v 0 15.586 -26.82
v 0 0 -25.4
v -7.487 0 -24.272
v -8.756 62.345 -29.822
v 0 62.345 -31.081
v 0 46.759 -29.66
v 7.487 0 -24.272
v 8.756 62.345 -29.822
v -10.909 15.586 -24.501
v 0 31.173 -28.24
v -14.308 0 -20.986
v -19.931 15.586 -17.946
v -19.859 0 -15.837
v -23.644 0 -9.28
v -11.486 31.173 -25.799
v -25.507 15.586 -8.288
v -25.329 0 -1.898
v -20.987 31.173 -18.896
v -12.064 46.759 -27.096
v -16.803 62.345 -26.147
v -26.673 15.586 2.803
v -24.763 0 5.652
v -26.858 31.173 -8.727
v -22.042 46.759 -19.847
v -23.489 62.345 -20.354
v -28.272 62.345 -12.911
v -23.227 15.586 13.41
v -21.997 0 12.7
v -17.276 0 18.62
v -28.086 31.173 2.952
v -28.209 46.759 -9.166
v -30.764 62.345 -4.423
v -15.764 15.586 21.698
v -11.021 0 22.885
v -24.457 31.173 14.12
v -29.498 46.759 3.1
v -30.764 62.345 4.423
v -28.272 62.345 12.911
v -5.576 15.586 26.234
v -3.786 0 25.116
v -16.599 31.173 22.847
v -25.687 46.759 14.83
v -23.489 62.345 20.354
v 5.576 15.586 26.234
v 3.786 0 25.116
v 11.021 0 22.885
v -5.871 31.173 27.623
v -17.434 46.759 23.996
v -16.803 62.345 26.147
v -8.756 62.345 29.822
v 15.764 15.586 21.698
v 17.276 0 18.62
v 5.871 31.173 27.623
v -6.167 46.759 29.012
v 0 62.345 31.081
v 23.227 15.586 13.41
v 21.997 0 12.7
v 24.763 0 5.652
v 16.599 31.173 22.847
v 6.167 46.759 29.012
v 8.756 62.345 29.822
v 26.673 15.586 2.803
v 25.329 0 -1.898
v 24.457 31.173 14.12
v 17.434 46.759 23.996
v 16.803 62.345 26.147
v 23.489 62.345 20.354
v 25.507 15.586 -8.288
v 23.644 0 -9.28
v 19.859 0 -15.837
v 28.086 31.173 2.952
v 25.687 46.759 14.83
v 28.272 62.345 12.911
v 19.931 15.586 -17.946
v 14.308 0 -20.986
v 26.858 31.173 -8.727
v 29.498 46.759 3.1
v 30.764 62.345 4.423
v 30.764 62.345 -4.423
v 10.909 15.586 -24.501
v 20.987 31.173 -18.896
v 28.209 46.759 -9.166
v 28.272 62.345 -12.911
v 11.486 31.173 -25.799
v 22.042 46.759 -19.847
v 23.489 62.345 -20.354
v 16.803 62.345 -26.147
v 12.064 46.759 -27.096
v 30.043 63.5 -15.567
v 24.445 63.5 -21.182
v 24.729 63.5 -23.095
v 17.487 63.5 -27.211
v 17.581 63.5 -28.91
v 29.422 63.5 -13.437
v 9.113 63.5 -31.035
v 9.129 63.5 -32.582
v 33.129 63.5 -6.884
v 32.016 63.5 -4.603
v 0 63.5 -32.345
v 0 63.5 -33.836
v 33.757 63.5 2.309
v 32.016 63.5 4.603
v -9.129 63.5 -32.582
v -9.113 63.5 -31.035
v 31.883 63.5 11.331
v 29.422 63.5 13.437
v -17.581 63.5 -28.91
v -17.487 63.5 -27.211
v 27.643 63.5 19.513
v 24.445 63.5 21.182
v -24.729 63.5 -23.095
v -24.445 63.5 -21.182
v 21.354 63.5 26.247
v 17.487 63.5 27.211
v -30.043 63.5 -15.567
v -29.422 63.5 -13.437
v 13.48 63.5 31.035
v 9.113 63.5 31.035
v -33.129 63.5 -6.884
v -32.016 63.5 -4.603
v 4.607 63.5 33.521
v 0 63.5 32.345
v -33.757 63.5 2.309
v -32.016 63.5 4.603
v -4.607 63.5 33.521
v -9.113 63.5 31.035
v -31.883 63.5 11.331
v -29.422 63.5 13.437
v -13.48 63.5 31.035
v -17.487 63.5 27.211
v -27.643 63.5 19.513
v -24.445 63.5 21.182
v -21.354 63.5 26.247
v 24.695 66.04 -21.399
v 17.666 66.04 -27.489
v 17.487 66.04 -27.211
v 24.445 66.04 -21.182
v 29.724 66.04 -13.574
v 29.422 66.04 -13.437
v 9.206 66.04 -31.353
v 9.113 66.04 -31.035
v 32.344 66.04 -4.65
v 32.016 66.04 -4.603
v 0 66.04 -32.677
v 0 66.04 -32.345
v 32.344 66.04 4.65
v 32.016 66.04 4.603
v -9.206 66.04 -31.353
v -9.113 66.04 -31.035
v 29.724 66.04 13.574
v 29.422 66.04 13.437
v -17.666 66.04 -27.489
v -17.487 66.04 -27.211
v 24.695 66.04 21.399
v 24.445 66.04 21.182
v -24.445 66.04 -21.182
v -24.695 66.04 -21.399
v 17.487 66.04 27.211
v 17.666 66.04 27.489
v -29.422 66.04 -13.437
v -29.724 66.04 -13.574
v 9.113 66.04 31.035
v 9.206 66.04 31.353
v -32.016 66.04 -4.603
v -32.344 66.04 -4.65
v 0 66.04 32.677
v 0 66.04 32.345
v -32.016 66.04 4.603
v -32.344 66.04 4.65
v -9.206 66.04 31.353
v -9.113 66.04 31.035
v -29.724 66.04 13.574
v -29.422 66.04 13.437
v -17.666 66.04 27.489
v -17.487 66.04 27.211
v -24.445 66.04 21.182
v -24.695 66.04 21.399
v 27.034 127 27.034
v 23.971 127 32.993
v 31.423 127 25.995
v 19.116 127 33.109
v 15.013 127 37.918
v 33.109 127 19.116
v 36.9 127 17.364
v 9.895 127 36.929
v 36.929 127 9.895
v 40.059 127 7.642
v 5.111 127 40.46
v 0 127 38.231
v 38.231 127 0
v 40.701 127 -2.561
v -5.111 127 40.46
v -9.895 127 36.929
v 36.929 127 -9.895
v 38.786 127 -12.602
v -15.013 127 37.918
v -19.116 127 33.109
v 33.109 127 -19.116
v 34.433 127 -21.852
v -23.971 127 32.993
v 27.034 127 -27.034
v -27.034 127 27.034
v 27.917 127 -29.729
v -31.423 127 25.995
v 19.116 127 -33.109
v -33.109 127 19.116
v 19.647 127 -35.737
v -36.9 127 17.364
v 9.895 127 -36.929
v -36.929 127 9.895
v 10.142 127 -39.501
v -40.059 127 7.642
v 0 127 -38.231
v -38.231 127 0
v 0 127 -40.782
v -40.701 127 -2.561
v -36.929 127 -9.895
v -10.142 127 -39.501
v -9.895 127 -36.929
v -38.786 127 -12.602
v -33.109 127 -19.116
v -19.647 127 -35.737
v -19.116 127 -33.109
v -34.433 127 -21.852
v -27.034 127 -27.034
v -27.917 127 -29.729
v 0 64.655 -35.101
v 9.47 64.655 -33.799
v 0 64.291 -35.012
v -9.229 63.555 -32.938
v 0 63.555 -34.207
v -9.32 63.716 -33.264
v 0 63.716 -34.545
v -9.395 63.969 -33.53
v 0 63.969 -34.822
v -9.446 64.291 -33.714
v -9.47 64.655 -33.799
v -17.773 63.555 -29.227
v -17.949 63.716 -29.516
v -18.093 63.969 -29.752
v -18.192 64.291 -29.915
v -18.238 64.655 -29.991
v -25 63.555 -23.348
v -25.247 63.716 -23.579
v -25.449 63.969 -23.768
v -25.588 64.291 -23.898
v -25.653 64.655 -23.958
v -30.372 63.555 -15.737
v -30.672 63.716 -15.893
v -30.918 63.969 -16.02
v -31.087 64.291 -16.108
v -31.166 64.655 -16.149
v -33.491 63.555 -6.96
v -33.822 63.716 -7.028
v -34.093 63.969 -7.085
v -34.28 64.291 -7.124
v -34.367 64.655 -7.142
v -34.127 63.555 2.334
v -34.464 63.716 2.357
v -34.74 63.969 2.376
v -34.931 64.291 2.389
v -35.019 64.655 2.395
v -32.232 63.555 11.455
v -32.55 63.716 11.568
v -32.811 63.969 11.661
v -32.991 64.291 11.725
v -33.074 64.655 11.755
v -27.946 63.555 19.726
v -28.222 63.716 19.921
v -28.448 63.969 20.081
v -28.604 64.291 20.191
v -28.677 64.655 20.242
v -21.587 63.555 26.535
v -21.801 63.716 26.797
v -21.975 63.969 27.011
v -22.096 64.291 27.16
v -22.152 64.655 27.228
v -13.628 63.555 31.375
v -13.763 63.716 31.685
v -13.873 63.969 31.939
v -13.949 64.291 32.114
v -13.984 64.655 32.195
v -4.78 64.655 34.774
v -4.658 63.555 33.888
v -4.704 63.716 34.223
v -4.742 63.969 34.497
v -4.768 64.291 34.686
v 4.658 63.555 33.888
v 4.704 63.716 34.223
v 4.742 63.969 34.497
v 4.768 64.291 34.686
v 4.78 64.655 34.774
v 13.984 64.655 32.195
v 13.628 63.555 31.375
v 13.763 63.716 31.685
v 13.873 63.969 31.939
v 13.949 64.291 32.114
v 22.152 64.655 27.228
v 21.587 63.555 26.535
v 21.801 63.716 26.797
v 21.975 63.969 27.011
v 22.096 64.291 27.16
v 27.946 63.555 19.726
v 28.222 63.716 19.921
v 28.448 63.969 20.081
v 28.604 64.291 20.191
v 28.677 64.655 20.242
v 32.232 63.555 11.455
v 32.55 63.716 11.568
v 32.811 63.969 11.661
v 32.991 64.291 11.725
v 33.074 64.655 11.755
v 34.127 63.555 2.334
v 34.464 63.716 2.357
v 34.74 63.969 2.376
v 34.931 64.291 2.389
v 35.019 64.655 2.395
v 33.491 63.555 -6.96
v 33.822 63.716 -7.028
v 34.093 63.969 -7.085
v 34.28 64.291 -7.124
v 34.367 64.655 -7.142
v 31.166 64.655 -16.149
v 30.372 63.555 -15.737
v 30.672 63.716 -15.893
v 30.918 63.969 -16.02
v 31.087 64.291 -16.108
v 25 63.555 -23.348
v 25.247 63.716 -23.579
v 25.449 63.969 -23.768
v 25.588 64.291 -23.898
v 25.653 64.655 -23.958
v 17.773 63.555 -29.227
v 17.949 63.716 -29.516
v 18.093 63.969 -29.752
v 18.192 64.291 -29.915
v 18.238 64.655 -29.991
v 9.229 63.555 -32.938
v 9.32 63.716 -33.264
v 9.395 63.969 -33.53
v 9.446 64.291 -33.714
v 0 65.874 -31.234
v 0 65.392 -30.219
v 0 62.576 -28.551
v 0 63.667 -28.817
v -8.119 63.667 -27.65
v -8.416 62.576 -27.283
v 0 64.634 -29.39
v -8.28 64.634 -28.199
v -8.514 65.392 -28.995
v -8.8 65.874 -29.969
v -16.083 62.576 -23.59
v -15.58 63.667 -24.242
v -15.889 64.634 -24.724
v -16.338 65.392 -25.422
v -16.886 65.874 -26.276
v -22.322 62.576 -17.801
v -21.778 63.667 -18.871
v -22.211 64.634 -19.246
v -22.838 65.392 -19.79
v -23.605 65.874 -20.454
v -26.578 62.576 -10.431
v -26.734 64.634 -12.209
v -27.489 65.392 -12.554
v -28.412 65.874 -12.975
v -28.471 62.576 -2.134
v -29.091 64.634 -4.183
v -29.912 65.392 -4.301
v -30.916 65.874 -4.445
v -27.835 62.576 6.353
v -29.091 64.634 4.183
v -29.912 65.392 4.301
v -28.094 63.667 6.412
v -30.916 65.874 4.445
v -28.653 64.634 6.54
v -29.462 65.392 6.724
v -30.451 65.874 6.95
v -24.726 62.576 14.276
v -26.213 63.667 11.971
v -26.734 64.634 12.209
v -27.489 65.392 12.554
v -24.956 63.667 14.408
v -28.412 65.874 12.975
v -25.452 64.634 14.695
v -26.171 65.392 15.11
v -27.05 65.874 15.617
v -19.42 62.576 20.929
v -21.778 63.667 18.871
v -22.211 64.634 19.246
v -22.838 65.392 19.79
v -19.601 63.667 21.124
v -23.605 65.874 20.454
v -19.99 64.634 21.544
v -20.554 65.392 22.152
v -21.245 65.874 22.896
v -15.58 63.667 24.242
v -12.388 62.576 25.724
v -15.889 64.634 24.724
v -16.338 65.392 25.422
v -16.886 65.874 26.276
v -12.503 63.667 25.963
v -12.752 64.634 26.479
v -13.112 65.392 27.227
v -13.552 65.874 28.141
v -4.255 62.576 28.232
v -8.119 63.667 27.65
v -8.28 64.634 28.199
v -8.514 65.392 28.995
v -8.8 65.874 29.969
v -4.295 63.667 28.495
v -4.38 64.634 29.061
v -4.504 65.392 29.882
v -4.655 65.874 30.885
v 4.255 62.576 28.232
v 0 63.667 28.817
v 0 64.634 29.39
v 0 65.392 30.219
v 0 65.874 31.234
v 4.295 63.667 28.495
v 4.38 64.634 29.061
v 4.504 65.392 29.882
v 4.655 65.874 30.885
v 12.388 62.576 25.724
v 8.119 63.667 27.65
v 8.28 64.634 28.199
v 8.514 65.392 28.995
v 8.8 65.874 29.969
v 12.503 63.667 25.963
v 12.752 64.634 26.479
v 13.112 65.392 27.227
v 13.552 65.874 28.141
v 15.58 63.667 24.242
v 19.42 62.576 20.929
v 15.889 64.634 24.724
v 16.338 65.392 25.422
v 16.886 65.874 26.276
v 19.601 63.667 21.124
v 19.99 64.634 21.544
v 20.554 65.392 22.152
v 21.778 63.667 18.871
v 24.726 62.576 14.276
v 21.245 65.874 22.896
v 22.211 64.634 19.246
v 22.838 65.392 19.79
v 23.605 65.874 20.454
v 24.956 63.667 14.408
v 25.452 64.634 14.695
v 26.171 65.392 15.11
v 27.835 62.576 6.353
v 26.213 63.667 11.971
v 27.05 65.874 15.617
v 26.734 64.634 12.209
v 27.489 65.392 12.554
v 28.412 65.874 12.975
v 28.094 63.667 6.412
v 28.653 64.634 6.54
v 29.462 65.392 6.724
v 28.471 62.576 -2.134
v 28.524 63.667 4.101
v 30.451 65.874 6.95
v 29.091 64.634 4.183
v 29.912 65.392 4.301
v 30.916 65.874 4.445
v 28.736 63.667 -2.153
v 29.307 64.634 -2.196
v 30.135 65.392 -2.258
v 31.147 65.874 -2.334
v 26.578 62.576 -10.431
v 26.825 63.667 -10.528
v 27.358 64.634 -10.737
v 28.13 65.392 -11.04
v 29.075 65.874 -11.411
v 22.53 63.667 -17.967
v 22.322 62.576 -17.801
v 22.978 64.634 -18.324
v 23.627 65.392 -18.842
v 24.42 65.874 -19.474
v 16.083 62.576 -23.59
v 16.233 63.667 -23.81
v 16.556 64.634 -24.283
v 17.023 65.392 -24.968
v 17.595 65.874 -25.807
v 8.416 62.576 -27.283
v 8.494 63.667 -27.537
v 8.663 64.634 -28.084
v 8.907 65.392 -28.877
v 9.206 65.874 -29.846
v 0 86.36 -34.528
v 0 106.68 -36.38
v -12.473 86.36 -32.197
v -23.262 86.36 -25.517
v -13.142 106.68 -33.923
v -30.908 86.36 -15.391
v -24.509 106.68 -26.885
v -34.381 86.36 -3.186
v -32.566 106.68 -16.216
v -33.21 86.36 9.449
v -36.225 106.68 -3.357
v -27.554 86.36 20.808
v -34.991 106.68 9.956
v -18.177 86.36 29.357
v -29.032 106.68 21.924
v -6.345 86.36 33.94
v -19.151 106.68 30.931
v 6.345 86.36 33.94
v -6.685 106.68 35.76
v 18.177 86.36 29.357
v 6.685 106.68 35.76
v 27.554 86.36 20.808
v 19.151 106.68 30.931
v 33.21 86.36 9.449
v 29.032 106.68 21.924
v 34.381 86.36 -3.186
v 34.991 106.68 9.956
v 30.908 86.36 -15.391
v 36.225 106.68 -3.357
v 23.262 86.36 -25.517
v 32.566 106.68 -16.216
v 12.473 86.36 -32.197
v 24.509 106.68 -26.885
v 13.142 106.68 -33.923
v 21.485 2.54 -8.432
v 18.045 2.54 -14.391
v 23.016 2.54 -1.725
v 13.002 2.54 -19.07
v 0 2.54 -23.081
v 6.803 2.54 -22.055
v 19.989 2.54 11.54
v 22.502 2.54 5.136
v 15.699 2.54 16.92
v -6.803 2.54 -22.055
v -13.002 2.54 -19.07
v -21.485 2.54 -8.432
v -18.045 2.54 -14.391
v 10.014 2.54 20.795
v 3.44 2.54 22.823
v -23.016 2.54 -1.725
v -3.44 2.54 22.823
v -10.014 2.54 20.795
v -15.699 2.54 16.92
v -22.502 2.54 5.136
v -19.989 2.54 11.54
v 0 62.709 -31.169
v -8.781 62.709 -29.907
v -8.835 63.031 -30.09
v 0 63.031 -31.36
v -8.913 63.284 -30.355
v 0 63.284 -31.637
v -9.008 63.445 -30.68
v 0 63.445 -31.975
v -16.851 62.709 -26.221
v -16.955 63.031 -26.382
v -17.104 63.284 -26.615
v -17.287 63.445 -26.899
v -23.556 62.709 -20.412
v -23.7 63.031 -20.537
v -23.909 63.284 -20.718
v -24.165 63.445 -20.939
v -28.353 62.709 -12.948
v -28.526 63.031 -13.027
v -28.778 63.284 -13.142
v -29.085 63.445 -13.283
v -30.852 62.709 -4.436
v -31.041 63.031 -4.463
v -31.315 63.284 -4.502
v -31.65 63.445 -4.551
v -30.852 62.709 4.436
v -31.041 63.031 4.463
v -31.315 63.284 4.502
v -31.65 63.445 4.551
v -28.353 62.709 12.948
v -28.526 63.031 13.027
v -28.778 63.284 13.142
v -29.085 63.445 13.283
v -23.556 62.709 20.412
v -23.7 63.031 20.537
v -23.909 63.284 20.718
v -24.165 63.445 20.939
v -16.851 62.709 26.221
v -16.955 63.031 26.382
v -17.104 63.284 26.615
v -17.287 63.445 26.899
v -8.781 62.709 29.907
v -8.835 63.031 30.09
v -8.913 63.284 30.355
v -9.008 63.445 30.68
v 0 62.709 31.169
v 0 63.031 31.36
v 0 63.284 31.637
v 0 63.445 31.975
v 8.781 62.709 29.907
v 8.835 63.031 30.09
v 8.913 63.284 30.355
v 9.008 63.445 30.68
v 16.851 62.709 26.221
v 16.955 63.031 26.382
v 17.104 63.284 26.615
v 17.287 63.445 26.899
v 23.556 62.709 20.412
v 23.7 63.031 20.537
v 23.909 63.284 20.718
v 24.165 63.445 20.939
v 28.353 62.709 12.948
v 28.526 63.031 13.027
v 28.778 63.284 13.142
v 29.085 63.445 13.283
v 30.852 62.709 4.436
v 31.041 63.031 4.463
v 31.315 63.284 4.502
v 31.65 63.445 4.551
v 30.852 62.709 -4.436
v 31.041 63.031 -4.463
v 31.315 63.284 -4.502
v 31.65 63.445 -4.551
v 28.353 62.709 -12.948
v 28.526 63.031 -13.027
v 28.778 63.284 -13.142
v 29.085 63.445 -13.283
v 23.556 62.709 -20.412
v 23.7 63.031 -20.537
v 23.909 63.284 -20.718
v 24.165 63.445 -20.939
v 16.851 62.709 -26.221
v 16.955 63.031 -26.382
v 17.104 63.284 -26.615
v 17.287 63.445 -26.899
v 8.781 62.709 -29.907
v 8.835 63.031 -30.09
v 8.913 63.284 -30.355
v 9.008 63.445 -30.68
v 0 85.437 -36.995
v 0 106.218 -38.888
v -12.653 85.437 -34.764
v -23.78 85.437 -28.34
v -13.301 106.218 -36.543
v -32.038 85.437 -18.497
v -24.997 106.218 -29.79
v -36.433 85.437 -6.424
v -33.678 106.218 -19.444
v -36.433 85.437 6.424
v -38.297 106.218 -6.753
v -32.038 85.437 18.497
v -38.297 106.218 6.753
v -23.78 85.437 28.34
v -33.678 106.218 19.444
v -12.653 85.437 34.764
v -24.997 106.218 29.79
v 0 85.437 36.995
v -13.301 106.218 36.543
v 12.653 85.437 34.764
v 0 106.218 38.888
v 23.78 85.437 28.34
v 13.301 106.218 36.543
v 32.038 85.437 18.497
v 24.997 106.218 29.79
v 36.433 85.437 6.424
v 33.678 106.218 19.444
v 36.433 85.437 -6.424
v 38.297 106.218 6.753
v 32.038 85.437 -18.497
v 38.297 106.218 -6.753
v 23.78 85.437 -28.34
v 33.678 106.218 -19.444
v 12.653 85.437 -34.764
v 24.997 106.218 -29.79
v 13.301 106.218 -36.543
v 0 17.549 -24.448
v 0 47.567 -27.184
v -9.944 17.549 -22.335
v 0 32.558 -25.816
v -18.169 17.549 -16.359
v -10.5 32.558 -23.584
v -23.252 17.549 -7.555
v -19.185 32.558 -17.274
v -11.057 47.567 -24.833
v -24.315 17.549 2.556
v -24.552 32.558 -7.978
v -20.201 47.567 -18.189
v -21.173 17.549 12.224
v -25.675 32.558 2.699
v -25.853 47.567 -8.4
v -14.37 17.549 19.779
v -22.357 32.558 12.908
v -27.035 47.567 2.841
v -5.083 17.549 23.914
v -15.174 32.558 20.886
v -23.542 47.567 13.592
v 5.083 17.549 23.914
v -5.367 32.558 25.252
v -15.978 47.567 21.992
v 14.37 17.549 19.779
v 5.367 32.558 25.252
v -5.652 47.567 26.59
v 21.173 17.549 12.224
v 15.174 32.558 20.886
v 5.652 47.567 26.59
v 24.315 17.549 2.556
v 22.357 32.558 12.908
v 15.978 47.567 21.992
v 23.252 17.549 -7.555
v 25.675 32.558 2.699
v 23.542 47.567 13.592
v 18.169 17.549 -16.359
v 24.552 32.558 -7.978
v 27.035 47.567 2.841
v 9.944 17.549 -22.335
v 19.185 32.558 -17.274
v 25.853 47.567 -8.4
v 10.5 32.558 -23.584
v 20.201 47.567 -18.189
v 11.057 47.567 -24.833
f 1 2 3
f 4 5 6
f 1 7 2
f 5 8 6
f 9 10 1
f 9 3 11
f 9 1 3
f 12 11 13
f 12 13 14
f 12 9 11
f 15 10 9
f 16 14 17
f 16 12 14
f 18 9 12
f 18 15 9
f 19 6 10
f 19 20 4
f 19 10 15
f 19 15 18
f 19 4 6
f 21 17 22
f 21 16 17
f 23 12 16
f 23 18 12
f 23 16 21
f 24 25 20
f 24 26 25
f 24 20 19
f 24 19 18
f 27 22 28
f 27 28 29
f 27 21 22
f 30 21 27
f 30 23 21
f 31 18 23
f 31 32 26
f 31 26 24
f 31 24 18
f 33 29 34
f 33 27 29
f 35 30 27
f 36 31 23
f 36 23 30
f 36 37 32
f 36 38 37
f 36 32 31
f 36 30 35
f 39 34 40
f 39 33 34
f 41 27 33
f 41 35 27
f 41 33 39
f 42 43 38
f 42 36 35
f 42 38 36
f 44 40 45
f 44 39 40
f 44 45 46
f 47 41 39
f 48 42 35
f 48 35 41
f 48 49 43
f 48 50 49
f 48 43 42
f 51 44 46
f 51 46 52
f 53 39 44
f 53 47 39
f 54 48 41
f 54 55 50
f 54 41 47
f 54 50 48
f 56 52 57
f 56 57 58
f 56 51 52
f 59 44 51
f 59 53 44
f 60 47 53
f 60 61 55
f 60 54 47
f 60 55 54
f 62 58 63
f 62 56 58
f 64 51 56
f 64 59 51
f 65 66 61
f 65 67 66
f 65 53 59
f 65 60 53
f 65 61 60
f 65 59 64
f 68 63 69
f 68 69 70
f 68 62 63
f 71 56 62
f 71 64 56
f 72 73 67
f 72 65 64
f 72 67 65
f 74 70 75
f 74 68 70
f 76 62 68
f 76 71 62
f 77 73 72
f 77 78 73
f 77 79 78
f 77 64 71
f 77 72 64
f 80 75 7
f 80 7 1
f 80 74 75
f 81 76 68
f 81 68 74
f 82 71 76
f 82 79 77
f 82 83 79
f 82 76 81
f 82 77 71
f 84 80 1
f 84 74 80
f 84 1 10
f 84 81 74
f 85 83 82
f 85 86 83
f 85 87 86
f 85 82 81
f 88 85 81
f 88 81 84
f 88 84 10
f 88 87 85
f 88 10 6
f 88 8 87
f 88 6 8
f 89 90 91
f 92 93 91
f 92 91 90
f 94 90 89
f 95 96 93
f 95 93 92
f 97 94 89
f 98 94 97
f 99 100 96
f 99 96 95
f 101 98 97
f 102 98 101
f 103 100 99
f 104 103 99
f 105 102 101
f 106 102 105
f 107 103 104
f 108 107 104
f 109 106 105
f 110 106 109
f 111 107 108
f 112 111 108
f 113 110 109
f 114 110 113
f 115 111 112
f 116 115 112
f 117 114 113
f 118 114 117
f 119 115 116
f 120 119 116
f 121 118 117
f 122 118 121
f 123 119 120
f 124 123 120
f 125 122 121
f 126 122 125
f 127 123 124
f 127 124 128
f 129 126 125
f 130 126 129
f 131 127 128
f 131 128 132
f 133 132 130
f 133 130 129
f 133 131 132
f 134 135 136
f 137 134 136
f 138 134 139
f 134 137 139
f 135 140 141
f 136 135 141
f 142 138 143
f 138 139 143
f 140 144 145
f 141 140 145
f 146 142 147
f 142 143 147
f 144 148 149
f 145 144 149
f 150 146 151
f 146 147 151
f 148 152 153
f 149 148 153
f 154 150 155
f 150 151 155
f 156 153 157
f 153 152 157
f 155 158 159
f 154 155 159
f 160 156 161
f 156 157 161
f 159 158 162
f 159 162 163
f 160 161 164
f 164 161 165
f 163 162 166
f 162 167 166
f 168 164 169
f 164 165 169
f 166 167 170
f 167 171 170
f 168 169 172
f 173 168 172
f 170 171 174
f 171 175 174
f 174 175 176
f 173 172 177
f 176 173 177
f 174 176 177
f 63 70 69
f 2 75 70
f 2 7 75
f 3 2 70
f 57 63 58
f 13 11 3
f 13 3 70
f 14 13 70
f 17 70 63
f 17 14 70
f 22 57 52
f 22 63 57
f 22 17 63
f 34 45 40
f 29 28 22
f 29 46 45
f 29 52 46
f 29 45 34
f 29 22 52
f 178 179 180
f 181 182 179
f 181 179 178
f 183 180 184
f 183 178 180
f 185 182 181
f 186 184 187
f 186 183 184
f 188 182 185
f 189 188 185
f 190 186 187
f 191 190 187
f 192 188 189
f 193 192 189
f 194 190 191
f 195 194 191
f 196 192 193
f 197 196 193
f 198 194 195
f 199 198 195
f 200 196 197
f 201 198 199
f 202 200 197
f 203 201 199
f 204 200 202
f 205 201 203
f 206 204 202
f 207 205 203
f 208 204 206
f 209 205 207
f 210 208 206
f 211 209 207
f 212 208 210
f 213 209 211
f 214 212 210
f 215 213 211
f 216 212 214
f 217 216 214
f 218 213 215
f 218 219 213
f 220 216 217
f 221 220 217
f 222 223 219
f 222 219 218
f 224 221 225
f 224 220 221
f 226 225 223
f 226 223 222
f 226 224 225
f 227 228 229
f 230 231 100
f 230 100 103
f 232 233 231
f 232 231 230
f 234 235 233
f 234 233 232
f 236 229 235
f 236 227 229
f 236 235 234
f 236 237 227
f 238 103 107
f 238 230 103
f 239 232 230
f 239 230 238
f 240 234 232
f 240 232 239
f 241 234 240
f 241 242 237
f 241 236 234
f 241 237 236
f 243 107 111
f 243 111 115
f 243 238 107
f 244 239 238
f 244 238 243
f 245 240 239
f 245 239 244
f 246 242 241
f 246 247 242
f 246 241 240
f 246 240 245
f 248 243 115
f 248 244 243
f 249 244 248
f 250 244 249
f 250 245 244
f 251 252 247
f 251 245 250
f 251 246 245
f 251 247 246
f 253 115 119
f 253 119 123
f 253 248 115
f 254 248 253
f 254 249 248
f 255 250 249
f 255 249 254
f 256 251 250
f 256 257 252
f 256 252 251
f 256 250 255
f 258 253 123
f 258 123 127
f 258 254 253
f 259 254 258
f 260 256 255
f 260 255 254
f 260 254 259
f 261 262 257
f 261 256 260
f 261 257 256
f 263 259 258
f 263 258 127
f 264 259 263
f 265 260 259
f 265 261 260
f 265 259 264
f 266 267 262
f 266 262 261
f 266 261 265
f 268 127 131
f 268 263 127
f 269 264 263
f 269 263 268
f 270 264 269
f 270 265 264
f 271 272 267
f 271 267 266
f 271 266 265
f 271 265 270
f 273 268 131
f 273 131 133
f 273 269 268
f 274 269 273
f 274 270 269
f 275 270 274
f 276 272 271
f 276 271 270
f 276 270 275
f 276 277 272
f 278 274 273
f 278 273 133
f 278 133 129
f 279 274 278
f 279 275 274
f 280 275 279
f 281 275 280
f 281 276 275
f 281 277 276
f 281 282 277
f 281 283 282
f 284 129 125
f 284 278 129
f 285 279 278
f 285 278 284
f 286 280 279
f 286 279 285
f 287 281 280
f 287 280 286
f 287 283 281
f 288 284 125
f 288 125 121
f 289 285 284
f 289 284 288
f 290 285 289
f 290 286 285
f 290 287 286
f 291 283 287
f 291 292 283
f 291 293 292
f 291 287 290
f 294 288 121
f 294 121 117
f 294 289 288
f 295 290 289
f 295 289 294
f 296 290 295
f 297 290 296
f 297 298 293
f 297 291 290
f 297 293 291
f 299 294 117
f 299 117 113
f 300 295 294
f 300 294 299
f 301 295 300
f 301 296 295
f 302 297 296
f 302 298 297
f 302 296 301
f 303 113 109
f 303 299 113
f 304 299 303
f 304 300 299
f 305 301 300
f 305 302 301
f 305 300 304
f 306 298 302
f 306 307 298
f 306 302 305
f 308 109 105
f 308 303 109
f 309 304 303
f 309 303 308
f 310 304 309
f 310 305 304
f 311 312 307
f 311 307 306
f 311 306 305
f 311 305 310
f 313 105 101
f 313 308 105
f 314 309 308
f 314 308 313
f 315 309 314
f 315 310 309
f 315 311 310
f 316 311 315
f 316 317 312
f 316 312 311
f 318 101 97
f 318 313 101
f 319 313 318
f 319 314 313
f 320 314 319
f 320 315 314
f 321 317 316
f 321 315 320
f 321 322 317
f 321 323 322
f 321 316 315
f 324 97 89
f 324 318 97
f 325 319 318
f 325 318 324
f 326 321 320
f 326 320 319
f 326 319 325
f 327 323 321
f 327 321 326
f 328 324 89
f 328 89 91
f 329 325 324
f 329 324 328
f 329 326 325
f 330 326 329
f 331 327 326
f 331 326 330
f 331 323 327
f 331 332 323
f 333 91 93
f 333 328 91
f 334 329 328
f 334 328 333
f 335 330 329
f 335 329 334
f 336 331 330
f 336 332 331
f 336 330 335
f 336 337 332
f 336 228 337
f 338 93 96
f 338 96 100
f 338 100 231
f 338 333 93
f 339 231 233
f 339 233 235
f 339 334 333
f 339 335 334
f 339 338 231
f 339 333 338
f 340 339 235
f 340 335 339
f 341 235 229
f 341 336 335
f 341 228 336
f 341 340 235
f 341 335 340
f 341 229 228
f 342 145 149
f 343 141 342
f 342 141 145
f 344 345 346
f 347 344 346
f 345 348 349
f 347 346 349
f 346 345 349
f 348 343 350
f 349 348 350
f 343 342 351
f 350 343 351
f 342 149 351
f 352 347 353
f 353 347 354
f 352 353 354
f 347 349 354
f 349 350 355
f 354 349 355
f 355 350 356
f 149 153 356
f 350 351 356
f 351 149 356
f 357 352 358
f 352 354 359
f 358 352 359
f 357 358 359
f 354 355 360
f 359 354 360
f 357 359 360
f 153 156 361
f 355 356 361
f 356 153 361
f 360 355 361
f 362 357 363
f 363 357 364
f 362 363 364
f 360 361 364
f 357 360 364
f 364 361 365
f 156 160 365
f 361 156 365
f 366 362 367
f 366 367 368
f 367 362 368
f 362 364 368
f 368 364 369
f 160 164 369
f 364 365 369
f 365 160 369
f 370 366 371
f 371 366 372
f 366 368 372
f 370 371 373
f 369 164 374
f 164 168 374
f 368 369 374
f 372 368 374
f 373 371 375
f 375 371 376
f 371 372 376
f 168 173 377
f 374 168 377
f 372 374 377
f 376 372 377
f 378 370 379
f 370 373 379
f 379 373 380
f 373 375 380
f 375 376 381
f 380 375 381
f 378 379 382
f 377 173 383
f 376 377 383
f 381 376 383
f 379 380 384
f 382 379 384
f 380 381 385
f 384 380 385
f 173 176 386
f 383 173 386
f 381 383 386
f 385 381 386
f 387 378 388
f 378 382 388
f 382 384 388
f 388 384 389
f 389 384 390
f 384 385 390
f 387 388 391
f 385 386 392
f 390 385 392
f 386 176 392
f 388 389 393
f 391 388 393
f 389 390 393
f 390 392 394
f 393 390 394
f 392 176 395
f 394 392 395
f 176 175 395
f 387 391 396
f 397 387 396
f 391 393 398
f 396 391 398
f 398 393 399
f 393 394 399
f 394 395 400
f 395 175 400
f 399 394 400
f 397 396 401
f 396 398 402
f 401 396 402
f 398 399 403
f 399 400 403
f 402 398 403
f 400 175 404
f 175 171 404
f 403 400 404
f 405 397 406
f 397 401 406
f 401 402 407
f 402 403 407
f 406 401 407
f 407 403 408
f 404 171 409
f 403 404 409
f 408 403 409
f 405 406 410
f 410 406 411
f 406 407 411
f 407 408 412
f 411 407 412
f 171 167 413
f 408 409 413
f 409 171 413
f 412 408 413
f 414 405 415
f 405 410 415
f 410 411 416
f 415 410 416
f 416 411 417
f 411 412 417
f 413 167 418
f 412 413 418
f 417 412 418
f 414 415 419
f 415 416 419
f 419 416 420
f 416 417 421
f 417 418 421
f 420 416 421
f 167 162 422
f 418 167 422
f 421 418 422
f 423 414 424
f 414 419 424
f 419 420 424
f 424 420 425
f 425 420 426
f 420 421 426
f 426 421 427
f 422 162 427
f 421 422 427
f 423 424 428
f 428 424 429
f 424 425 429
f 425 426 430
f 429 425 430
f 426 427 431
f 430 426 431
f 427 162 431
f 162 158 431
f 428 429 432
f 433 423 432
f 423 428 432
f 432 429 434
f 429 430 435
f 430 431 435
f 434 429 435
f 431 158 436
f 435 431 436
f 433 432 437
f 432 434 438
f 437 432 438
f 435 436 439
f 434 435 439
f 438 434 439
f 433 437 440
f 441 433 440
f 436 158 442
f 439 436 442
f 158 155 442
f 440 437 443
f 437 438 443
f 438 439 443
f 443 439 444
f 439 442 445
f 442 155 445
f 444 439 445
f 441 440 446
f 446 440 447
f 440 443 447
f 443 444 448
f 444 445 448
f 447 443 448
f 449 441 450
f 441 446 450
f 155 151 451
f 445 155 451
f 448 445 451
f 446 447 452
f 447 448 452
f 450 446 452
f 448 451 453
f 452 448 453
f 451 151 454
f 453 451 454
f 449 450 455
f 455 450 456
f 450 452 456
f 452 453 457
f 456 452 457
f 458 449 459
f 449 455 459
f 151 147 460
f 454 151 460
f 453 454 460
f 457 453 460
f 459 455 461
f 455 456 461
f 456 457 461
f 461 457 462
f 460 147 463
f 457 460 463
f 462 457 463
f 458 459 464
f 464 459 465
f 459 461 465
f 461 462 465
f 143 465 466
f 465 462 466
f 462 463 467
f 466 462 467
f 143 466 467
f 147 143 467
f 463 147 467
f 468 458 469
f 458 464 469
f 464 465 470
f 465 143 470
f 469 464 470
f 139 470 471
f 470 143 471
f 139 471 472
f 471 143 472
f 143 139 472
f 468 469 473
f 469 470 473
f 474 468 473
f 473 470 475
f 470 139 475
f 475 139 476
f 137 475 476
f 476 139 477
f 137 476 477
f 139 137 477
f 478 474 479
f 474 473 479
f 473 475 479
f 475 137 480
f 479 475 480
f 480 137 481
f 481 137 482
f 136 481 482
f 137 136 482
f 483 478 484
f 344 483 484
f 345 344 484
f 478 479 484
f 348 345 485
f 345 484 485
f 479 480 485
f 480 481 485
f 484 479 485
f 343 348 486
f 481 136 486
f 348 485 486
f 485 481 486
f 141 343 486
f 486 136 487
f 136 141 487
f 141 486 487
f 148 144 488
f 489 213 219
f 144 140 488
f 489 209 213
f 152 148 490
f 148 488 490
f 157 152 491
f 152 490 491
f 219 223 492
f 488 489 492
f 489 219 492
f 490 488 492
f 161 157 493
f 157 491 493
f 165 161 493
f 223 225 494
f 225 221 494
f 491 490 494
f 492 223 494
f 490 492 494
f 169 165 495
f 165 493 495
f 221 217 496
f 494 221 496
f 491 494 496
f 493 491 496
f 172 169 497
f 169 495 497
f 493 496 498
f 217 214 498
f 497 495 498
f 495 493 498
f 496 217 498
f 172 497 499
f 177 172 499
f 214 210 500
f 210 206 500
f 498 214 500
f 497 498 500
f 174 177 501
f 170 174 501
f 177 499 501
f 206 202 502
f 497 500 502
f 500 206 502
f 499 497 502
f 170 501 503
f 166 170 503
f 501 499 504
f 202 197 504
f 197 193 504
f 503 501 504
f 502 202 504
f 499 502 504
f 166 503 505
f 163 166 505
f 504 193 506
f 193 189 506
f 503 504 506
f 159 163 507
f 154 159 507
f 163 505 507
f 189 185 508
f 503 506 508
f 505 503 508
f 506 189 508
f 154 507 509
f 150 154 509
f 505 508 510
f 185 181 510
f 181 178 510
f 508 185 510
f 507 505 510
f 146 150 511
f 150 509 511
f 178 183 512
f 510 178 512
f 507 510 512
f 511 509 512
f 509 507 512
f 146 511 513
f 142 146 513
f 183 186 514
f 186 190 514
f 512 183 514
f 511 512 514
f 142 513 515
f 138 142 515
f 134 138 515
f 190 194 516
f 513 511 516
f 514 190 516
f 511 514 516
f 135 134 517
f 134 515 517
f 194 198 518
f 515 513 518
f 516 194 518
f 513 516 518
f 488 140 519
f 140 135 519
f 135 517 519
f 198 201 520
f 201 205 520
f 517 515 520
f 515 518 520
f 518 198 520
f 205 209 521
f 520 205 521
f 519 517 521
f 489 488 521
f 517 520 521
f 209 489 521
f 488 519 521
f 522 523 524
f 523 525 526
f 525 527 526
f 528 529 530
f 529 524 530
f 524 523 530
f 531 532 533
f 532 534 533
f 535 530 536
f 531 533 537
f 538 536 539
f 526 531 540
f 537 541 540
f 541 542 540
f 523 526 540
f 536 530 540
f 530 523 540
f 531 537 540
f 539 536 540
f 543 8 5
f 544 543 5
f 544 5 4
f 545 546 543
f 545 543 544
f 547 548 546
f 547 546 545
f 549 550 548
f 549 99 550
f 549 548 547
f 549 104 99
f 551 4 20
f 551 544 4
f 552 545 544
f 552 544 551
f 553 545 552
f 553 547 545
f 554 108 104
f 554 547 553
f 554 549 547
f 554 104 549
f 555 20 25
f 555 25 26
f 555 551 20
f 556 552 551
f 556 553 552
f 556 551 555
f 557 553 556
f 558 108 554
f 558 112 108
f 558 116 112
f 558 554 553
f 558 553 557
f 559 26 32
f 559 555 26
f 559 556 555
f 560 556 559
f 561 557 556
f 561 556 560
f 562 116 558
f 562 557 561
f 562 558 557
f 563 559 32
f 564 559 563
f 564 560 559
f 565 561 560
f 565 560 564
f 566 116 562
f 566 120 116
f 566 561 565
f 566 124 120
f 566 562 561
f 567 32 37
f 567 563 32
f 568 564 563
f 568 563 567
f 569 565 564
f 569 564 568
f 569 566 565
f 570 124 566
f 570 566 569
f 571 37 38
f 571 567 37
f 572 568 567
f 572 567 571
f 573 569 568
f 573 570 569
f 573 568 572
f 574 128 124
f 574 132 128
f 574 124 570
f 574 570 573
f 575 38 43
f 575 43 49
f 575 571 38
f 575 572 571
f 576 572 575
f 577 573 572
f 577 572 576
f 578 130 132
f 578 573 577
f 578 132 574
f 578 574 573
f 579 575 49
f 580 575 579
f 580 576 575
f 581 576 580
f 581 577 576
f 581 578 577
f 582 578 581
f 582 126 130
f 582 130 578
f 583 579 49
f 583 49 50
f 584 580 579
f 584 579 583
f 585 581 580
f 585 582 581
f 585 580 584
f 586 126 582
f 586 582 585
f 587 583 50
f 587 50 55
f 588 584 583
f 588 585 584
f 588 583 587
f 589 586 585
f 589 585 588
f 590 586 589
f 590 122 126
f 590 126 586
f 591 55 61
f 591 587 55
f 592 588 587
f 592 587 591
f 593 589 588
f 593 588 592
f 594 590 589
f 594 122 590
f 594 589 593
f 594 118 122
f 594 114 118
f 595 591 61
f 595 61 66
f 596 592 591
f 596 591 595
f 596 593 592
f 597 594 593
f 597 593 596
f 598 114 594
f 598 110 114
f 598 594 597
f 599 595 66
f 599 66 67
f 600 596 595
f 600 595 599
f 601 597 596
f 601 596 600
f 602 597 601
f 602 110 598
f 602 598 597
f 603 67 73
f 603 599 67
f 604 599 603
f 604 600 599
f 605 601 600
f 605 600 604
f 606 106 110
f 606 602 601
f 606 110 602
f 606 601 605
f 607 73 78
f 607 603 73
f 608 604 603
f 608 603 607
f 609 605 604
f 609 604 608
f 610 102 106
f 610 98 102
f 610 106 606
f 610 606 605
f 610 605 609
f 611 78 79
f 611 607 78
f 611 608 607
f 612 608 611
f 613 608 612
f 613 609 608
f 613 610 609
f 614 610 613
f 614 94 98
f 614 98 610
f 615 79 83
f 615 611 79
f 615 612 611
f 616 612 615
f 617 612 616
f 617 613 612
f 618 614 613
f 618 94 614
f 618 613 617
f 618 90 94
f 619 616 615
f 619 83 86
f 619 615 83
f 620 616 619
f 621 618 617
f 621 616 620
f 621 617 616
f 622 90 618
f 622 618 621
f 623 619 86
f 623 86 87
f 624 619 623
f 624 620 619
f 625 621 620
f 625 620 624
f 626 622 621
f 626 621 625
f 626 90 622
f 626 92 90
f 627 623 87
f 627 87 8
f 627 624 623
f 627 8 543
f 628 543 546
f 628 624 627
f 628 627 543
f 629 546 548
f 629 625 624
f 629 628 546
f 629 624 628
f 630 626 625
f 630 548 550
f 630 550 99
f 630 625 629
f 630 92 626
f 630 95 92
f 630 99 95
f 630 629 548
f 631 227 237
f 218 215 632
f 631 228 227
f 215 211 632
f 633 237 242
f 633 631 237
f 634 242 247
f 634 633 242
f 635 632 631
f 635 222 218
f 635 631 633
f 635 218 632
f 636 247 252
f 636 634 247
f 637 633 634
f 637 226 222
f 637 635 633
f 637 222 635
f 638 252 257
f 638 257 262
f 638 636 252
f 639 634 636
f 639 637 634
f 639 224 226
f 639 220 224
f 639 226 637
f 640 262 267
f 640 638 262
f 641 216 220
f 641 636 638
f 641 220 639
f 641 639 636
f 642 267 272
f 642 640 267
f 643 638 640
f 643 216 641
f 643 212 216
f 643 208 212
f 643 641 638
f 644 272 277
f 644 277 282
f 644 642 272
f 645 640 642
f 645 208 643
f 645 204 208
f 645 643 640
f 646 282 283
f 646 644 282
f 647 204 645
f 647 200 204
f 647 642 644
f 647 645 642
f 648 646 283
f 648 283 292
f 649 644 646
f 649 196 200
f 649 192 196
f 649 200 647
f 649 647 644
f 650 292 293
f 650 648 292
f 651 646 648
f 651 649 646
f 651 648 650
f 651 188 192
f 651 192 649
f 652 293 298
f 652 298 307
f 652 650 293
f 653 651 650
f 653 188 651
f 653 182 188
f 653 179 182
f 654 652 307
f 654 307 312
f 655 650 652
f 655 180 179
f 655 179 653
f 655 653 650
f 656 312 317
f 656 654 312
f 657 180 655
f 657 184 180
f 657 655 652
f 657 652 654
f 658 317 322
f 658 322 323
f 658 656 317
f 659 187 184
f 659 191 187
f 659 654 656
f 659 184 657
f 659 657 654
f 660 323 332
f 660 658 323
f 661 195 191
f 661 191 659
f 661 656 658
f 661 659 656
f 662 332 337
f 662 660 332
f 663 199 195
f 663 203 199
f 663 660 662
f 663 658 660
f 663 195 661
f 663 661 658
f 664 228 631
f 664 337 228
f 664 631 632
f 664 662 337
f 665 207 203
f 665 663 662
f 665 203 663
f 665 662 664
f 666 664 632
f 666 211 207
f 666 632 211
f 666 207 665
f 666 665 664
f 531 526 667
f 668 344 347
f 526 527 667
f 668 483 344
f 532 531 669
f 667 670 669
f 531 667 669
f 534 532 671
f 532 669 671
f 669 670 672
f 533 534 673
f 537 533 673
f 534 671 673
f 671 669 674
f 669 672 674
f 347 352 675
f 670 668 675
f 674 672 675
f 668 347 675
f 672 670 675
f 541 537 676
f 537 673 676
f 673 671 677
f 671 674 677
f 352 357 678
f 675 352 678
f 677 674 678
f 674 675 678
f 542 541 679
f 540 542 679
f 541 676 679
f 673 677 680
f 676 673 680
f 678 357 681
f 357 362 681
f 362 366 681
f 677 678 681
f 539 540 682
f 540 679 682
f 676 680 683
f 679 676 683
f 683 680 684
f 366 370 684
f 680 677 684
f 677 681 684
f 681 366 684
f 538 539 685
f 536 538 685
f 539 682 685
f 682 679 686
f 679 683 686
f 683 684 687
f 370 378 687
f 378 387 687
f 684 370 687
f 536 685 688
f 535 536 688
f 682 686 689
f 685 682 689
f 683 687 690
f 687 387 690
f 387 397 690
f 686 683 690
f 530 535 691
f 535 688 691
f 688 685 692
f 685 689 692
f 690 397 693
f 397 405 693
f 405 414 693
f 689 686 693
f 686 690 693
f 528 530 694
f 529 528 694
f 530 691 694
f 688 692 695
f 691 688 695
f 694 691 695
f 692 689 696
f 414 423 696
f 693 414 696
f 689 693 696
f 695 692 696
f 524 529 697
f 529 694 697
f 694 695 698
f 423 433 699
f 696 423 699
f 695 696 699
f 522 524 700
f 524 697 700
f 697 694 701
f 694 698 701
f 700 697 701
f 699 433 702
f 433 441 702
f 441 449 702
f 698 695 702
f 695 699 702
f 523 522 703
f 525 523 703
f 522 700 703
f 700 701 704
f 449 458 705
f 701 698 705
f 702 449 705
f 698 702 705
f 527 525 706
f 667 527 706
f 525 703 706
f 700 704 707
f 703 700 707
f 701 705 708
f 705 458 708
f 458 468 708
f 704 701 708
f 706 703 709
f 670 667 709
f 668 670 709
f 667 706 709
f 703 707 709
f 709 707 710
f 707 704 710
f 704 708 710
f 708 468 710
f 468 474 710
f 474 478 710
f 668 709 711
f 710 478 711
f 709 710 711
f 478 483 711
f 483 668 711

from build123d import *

# Parameters (mm, degrees)
FILLET1_R = 1.27
SHELL1_T  = -2.54


with BuildPart() as part:
    # Sketch1 → Revolve2 (revolve)
    with BuildSketch(Plane.XY, mode=Mode.PRIVATE) as revolve2_sk:
        Polygon((0, 0), (25.4, 0), (31.185877256, 63.5), (34.995877256, 63.5), (40.781754513, 127), (0, 127), align=None)
    revolve(revolve2_sk.sketch.rotate(Axis((0, 0, 0), (0, 1, 0)), 90), axis=Axis((0, 0, 0), (0, 1, 0)))

    # Fillet1
    fillet1_edges = [part.edges().sort_by_distance(p)[0] for p in [
        (0, 63.5, 34.995877256),
        (0, 63.5, 31.185877256),
    ]]
    fillet(fillet1_edges, radius=FILLET1_R)

    # Shell1
    shell1_openings = [part.faces().sort_by_distance(p)[0] for p in [
        (0, 127, 0),
    ]]
    offset(amount=SHELL1_T, openings=shell1_openings, kind=Kind.INTERSECTION)


solid = part.part
